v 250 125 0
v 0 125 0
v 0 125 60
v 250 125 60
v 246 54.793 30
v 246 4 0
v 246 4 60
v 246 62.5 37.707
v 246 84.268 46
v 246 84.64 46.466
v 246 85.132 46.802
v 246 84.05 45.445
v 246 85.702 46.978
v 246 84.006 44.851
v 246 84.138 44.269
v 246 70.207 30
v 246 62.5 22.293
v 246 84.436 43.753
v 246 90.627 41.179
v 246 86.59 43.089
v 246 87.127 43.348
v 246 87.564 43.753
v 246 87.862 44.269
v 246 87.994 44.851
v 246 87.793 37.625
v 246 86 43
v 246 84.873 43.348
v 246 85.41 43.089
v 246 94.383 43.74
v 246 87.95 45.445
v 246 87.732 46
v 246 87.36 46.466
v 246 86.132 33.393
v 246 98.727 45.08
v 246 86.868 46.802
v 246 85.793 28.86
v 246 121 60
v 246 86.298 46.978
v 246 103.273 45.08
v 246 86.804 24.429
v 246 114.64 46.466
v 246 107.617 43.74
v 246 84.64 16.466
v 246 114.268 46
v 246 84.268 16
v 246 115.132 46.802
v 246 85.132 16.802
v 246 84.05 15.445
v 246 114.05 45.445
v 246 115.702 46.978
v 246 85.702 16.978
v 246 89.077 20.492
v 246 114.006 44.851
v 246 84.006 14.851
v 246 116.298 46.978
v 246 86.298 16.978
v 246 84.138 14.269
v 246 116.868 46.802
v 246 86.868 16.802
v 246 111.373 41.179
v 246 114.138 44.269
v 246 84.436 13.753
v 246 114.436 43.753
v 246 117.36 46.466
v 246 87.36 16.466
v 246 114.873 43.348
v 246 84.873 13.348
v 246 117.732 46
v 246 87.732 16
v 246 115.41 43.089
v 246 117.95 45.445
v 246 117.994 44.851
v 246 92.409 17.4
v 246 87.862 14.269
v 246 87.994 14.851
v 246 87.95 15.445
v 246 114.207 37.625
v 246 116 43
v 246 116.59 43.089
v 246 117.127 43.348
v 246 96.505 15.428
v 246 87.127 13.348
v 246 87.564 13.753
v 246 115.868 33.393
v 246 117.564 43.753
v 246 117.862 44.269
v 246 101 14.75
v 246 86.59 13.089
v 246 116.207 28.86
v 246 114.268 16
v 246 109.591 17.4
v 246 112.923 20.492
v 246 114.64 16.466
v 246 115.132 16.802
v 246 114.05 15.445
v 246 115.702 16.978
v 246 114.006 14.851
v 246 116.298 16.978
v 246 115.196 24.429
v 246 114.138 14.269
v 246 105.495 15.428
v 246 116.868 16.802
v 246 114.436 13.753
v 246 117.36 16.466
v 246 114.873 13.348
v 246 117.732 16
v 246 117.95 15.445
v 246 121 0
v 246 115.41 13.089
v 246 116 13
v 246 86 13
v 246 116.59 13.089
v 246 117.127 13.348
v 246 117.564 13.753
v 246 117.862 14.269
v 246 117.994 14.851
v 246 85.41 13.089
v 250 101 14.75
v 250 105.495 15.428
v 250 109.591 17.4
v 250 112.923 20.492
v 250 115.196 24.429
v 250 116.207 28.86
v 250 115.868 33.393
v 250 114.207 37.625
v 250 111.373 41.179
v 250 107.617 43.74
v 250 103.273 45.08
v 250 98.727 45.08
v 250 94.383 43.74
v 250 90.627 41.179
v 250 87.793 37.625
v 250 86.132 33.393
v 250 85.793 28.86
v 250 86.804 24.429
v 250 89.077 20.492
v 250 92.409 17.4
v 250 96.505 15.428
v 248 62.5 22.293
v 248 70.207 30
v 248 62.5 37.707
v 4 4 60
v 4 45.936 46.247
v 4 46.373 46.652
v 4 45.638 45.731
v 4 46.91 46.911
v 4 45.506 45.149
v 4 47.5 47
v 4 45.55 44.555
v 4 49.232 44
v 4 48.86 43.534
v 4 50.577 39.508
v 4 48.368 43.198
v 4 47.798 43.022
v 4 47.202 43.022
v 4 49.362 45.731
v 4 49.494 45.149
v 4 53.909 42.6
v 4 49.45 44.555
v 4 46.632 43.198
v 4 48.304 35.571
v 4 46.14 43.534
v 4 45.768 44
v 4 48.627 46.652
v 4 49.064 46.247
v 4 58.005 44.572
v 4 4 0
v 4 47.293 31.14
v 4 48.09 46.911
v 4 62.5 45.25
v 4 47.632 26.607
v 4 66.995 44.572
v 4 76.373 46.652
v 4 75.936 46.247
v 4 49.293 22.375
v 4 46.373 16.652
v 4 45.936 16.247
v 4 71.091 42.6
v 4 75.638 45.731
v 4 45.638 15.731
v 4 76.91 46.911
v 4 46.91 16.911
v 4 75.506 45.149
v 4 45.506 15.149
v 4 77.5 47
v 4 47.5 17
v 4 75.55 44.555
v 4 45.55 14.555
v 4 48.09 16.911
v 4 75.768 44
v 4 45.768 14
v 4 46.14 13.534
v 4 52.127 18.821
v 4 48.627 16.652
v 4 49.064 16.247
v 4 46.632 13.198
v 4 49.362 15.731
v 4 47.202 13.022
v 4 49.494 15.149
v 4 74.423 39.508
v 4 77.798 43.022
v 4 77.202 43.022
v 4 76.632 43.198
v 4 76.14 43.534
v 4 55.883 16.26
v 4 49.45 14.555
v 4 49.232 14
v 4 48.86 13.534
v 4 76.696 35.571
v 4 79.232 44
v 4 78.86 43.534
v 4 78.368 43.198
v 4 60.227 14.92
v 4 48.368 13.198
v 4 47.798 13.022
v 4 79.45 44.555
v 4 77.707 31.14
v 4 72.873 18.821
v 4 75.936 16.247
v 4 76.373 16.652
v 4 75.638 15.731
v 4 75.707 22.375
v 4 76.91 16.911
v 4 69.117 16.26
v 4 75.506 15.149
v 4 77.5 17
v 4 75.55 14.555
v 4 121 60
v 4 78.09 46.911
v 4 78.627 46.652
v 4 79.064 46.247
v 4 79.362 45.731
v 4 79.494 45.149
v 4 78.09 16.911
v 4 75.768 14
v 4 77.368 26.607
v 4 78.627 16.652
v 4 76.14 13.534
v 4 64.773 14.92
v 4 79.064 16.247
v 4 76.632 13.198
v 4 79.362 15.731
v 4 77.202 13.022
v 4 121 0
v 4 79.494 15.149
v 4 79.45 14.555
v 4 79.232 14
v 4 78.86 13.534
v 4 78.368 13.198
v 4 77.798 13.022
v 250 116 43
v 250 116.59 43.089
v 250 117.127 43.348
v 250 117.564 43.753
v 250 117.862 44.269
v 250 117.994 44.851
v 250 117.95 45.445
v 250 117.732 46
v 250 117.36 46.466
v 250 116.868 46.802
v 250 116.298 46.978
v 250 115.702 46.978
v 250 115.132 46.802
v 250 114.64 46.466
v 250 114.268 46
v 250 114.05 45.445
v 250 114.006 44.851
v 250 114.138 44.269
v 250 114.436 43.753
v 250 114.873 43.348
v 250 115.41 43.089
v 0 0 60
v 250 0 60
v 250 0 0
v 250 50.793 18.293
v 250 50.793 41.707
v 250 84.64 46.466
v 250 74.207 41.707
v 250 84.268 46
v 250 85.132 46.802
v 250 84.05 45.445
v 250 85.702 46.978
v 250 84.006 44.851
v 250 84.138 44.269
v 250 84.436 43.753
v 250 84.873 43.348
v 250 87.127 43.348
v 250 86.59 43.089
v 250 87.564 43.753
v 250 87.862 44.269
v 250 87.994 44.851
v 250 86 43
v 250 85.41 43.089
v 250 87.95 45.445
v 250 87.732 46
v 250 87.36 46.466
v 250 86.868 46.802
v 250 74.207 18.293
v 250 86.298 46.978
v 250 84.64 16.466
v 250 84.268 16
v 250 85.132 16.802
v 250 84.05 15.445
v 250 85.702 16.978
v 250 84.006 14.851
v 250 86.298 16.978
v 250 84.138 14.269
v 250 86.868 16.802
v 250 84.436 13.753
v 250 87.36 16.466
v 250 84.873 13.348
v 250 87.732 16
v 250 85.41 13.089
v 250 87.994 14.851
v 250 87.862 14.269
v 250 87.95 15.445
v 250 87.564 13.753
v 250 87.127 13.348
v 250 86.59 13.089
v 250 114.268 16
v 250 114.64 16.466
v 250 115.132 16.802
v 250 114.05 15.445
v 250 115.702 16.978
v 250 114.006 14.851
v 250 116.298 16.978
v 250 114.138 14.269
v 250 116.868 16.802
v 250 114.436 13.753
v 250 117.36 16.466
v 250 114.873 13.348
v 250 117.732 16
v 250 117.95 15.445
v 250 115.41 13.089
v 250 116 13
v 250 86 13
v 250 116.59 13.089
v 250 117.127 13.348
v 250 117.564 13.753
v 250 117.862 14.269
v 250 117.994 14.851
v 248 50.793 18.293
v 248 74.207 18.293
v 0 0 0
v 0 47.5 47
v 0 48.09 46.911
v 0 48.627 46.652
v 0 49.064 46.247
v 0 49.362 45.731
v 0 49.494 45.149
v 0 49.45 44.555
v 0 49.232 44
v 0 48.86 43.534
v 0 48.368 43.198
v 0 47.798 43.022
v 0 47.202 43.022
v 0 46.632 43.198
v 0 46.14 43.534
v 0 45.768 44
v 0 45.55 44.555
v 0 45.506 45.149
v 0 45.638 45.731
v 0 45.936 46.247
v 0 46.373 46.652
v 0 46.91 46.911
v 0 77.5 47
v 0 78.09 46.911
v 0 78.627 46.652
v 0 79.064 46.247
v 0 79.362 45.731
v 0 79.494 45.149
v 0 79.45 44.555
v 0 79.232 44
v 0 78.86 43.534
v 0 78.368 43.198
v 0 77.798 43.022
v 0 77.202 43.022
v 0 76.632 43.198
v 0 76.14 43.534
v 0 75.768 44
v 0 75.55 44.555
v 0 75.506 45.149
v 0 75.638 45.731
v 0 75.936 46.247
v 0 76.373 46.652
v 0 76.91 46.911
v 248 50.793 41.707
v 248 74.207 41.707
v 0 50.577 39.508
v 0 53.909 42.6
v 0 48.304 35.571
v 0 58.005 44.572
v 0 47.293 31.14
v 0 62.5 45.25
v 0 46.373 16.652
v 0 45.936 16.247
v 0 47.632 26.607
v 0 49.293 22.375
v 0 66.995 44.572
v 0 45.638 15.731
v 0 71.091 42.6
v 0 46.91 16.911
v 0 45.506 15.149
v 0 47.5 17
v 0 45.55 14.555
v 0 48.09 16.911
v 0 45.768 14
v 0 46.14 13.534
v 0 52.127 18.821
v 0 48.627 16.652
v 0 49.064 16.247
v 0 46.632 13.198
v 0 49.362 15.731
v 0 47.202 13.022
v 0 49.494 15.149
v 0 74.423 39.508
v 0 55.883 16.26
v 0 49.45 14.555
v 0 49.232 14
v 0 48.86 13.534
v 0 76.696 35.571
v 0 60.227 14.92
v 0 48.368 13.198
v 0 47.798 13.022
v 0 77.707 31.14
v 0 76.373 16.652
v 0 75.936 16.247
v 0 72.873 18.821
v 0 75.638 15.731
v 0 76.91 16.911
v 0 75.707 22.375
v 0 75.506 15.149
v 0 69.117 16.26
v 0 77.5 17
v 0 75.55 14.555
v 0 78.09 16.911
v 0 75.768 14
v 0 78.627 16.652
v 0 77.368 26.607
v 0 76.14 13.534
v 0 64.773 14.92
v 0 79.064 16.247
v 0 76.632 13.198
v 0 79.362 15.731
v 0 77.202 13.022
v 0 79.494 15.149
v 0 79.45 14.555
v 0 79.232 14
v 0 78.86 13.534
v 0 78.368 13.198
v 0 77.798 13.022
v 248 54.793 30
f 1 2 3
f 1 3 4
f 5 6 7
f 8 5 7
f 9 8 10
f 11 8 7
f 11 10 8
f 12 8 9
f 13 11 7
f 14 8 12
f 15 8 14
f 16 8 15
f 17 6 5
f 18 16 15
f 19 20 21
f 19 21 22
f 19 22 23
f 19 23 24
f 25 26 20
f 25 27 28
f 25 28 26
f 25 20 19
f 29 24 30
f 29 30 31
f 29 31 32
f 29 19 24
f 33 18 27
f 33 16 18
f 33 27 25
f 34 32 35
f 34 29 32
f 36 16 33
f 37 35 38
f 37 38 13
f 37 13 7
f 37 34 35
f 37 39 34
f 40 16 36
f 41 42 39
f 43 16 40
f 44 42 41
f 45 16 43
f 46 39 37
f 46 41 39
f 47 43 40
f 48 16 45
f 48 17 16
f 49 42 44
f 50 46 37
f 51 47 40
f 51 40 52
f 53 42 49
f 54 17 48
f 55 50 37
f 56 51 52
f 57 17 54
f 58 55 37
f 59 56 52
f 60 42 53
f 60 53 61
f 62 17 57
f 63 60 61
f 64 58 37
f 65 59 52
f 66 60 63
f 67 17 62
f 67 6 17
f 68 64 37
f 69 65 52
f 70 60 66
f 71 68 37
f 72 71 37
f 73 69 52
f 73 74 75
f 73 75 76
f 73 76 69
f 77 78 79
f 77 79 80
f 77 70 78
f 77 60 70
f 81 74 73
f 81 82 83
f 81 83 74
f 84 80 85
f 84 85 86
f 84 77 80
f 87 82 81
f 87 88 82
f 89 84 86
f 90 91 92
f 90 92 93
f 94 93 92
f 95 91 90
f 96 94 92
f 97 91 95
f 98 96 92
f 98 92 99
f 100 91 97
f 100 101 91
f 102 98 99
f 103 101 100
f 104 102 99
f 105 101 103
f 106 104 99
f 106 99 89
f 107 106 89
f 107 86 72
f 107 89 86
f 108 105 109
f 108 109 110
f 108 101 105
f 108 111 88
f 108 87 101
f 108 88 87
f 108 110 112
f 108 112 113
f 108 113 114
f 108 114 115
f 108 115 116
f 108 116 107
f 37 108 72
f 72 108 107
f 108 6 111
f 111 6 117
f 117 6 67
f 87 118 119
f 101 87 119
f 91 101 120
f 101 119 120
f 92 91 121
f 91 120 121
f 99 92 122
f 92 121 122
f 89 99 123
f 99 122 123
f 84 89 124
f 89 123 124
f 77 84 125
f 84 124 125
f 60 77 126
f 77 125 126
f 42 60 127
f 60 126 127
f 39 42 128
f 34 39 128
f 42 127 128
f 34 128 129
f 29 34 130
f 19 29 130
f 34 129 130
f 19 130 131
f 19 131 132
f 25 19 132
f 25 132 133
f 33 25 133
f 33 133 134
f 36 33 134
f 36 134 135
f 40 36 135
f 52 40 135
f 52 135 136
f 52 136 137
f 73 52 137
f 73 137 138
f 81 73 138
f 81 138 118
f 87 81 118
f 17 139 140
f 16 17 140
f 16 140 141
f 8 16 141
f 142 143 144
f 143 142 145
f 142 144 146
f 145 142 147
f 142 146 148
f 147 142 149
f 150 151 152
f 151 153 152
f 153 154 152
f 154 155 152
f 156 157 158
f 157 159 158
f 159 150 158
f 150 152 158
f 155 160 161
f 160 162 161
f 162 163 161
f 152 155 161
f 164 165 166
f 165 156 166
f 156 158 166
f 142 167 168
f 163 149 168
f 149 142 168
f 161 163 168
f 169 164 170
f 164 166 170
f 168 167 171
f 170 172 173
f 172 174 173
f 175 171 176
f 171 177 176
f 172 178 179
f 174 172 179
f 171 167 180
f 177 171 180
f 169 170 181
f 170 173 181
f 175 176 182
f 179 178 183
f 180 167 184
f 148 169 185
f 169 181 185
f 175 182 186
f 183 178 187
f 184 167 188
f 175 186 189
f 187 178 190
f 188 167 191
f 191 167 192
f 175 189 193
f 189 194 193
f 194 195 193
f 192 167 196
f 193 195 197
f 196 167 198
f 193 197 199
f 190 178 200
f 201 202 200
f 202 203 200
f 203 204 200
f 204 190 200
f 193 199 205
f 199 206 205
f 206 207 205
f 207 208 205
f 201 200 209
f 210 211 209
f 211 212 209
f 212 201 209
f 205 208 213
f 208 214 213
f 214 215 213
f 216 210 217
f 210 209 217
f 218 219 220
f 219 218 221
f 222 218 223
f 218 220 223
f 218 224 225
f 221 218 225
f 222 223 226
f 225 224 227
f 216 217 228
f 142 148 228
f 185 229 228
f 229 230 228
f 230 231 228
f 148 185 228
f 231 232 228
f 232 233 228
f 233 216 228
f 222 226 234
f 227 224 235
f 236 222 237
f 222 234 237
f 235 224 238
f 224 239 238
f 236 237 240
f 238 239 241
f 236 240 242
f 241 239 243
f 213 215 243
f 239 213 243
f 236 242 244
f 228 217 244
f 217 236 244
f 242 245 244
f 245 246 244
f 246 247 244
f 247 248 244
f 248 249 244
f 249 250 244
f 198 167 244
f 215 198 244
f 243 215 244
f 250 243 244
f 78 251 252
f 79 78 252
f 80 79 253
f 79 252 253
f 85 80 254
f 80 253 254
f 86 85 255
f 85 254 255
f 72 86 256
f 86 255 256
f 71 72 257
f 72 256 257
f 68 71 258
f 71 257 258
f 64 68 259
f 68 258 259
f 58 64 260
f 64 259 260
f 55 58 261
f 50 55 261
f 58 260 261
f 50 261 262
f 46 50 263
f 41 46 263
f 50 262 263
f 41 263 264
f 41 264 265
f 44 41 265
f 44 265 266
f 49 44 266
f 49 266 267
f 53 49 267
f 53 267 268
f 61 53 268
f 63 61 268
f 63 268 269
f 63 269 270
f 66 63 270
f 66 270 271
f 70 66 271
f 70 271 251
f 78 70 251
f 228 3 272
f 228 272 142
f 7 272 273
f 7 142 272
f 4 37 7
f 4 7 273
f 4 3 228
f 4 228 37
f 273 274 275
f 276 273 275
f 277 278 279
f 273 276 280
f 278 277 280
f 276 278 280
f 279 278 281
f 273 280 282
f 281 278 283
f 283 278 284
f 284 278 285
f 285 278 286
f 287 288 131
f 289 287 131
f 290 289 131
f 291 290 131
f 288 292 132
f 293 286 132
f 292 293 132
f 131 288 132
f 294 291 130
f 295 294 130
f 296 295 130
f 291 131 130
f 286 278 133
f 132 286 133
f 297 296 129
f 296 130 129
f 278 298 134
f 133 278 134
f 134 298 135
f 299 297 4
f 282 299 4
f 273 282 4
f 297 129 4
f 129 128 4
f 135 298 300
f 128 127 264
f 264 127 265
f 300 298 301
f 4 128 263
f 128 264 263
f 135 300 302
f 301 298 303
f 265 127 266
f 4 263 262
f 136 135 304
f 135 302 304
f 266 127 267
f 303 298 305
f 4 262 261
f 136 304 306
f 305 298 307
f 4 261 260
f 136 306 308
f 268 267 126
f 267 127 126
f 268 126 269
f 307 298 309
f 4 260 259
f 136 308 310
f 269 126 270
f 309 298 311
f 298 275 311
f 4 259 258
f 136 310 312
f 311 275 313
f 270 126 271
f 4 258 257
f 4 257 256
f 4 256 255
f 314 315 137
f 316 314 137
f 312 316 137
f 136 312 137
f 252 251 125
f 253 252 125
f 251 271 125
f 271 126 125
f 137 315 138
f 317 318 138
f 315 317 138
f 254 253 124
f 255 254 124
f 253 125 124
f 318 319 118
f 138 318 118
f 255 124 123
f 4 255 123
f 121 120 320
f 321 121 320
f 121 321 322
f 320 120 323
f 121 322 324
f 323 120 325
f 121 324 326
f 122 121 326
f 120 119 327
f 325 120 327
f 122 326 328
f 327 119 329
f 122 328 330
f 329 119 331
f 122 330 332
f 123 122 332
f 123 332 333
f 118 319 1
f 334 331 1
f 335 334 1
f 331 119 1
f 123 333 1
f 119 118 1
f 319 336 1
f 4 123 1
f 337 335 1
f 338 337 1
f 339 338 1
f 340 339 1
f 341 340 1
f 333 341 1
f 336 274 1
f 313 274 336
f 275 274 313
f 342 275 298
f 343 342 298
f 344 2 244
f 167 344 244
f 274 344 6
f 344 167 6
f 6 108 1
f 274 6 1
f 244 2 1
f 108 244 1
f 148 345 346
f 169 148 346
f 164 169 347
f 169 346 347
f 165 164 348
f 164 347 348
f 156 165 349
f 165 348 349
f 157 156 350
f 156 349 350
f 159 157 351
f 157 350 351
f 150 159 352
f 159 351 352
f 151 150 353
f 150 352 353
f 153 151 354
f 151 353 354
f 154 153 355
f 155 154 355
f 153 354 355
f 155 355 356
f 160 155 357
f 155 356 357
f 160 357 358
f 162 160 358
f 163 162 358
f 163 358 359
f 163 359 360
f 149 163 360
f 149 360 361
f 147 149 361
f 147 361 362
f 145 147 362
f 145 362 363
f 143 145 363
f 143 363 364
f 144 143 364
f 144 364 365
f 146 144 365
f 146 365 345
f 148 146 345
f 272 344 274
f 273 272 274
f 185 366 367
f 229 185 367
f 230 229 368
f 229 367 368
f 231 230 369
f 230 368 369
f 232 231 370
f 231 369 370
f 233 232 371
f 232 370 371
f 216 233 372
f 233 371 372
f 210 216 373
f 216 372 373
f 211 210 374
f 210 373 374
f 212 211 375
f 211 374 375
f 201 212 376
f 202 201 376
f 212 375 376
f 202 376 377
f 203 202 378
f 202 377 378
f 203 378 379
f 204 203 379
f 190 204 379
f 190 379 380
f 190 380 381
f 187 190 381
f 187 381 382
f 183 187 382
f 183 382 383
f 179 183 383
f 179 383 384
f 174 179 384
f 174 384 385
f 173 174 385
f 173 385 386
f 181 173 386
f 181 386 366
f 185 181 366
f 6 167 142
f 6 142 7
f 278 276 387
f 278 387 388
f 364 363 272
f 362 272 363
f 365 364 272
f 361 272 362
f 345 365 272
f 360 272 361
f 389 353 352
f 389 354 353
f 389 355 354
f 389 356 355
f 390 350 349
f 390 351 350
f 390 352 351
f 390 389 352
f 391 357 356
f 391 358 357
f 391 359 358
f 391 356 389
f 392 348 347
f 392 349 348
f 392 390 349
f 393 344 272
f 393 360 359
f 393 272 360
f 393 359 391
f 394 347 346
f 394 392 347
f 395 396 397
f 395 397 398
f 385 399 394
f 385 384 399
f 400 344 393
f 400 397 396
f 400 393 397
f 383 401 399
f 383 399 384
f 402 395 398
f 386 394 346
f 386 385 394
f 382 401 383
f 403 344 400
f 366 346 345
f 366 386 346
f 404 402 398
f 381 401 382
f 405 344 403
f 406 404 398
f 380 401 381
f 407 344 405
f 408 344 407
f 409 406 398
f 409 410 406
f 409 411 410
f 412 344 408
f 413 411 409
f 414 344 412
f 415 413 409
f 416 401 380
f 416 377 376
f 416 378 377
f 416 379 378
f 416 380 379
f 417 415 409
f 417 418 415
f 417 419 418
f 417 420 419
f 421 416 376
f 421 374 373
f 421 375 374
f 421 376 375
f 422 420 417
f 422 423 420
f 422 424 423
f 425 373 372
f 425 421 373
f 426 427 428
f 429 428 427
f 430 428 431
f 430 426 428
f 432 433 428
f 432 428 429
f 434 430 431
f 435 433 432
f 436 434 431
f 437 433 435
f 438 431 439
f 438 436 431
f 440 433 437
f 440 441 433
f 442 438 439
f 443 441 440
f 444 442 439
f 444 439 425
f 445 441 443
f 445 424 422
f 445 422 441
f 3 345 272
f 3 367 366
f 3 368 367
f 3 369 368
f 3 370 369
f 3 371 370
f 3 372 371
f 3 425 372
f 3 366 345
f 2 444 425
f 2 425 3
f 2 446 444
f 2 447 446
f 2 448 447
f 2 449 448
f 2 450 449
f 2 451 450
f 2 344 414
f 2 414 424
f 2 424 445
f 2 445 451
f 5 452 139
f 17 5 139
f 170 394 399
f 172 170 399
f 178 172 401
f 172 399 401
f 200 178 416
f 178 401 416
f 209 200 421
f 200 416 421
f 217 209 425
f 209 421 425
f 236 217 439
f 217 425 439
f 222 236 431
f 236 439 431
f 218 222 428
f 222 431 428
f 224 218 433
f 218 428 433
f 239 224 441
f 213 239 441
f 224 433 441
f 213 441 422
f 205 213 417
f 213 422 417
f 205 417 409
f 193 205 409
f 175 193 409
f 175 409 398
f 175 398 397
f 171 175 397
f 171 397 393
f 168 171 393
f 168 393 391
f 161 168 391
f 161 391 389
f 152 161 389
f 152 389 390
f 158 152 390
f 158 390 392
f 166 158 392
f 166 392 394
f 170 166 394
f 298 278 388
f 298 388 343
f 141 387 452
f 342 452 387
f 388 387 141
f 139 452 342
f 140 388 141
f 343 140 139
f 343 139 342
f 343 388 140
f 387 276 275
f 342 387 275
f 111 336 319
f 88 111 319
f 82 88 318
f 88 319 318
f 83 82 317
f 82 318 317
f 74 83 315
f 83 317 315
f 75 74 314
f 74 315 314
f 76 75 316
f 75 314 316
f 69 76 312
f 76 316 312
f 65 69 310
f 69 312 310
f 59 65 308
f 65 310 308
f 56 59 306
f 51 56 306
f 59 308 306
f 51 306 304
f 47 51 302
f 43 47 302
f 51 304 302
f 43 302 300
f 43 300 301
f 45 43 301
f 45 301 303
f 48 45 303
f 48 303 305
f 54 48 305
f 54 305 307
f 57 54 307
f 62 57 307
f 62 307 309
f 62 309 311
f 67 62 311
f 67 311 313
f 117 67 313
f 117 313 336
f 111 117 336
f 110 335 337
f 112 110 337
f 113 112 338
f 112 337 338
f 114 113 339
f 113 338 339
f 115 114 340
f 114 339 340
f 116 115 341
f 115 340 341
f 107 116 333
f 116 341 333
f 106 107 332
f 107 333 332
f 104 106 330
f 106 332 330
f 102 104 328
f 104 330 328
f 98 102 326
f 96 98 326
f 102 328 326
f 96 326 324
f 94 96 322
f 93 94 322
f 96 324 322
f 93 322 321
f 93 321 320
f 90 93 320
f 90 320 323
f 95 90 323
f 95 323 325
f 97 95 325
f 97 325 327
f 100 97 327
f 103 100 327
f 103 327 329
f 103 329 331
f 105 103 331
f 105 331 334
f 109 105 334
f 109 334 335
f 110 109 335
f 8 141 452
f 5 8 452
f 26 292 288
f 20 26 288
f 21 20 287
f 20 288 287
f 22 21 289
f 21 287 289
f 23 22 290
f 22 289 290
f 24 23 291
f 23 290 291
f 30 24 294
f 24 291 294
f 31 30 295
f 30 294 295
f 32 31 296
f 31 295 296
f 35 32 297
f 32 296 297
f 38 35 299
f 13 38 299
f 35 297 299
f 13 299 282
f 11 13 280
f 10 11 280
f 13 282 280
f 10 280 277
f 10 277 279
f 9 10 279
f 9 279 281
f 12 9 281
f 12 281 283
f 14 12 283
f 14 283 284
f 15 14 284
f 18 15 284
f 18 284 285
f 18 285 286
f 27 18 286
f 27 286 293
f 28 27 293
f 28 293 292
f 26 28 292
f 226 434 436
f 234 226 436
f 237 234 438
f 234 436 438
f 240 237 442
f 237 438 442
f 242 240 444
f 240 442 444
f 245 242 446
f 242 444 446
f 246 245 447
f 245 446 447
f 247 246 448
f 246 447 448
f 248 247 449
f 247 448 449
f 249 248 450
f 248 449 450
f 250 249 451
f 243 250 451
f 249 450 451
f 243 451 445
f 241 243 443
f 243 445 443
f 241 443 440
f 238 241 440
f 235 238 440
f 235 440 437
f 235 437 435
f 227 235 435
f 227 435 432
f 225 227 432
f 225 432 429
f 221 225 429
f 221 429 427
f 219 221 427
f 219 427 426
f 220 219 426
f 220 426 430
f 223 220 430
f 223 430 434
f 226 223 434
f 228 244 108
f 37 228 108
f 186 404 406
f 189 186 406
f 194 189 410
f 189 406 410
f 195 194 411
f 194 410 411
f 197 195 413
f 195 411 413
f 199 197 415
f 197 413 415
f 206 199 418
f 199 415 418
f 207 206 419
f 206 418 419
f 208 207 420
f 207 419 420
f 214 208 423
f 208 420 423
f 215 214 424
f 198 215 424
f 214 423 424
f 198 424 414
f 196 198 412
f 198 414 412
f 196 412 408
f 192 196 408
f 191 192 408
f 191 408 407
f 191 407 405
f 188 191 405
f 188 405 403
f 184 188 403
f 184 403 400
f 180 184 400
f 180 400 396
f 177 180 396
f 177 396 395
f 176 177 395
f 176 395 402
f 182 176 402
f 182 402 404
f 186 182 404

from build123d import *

# Parameters (mm, degrees)
SKIZZE1_W                       = 250
SKIZZE1_H                       = 125
SKIZZE1_W_2                     = 242
SKIZZE1_H_2                     = 117
AUFSATZ_LINEAR_AUSTRAGEN1_DEPTH = 60
SKIZZE2_R                       = 15.25
SKIZZE2_R_2                     = 2
SCHNITT_LINEAR_AUSTRAGEN1_DEPTH = 10
SKIZZE8_R                       = 15.25
SKIZZE8_R_2                     = 2
SCHNITT_LINEAR_AUSTRAGEN6_DEPTH = 22
SKIZZE10_W                      = 23.41492783
SKIZZE10_H                      = 23.41492783
SCHNITT_LINEAR_AUSTRAGEN7_DEPTH = 2


with BuildPart() as part:
    # Skizze1 → Aufsatz-Linear austragen1 (new body)
    with BuildSketch(Plane.XY):
        with Locations((125, 62.5)):
            Rectangle(SKIZZE1_W, SKIZZE1_H)
        with Locations((125, 62.5)):
            Rectangle(SKIZZE1_W_2, SKIZZE1_H_2, mode=Mode.SUBTRACT)
    extrude(amount=AUFSATZ_LINEAR_AUSTRAGEN1_DEPTH)

    # Skizze2 → Schnitt-Linear austragen1 (cut)
    with BuildSketch(Plane.ZY):
        with Locations((30, 62.5)):
            Circle(SKIZZE2_R)
        with Locations((15, 77.5)):
            Circle(SKIZZE2_R_2)
        with Locations((45, 77.5)):
            Circle(SKIZZE2_R_2)
        with Locations((45, 47.5)):
            Circle(SKIZZE2_R_2)
        with Locations((15, 47.5)):
            Circle(SKIZZE2_R_2)
    extrude(amount=-SCHNITT_LINEAR_AUSTRAGEN1_DEPTH, mode=Mode.SUBTRACT)

    # Skizze8 → Schnitt-Linear austragen6 (cut)
    with BuildSketch(Plane(origin=(250, 0, 0), x_dir=(0, 0, -1), z_dir=(1, 0, 0))):
        with Locations((-30, 101)):
            Circle(SKIZZE8_R)
        with Locations((-45, 116)):
            Circle(SKIZZE8_R_2)
        with Locations((-15, 86)):
            Circle(SKIZZE8_R_2)
        with Locations((-45, 86)):
            Circle(SKIZZE8_R_2)
        with Locations((-15, 116)):
            Circle(SKIZZE8_R_2)
        Polygon((-30, 70.207463915), (-37.707463915, 62.5), (-30, 54.792536085), (-22.292536085, 62.5), align=None)
    extrude(amount=-SCHNITT_LINEAR_AUSTRAGEN6_DEPTH, mode=Mode.SUBTRACT)

    # Skizze10 → Schnitt-Linear austragen7 (cut)
    with BuildSketch(Plane(origin=(250, 0, 0), x_dir=(0, 0, -1), z_dir=(1, 0, 0))):
        with Locations((-30, 62.5)):
            Rectangle(SKIZZE10_W, SKIZZE10_H)
    extrude(amount=-SCHNITT_LINEAR_AUSTRAGEN7_DEPTH, mode=Mode.SUBTRACT)


solid = part.part
